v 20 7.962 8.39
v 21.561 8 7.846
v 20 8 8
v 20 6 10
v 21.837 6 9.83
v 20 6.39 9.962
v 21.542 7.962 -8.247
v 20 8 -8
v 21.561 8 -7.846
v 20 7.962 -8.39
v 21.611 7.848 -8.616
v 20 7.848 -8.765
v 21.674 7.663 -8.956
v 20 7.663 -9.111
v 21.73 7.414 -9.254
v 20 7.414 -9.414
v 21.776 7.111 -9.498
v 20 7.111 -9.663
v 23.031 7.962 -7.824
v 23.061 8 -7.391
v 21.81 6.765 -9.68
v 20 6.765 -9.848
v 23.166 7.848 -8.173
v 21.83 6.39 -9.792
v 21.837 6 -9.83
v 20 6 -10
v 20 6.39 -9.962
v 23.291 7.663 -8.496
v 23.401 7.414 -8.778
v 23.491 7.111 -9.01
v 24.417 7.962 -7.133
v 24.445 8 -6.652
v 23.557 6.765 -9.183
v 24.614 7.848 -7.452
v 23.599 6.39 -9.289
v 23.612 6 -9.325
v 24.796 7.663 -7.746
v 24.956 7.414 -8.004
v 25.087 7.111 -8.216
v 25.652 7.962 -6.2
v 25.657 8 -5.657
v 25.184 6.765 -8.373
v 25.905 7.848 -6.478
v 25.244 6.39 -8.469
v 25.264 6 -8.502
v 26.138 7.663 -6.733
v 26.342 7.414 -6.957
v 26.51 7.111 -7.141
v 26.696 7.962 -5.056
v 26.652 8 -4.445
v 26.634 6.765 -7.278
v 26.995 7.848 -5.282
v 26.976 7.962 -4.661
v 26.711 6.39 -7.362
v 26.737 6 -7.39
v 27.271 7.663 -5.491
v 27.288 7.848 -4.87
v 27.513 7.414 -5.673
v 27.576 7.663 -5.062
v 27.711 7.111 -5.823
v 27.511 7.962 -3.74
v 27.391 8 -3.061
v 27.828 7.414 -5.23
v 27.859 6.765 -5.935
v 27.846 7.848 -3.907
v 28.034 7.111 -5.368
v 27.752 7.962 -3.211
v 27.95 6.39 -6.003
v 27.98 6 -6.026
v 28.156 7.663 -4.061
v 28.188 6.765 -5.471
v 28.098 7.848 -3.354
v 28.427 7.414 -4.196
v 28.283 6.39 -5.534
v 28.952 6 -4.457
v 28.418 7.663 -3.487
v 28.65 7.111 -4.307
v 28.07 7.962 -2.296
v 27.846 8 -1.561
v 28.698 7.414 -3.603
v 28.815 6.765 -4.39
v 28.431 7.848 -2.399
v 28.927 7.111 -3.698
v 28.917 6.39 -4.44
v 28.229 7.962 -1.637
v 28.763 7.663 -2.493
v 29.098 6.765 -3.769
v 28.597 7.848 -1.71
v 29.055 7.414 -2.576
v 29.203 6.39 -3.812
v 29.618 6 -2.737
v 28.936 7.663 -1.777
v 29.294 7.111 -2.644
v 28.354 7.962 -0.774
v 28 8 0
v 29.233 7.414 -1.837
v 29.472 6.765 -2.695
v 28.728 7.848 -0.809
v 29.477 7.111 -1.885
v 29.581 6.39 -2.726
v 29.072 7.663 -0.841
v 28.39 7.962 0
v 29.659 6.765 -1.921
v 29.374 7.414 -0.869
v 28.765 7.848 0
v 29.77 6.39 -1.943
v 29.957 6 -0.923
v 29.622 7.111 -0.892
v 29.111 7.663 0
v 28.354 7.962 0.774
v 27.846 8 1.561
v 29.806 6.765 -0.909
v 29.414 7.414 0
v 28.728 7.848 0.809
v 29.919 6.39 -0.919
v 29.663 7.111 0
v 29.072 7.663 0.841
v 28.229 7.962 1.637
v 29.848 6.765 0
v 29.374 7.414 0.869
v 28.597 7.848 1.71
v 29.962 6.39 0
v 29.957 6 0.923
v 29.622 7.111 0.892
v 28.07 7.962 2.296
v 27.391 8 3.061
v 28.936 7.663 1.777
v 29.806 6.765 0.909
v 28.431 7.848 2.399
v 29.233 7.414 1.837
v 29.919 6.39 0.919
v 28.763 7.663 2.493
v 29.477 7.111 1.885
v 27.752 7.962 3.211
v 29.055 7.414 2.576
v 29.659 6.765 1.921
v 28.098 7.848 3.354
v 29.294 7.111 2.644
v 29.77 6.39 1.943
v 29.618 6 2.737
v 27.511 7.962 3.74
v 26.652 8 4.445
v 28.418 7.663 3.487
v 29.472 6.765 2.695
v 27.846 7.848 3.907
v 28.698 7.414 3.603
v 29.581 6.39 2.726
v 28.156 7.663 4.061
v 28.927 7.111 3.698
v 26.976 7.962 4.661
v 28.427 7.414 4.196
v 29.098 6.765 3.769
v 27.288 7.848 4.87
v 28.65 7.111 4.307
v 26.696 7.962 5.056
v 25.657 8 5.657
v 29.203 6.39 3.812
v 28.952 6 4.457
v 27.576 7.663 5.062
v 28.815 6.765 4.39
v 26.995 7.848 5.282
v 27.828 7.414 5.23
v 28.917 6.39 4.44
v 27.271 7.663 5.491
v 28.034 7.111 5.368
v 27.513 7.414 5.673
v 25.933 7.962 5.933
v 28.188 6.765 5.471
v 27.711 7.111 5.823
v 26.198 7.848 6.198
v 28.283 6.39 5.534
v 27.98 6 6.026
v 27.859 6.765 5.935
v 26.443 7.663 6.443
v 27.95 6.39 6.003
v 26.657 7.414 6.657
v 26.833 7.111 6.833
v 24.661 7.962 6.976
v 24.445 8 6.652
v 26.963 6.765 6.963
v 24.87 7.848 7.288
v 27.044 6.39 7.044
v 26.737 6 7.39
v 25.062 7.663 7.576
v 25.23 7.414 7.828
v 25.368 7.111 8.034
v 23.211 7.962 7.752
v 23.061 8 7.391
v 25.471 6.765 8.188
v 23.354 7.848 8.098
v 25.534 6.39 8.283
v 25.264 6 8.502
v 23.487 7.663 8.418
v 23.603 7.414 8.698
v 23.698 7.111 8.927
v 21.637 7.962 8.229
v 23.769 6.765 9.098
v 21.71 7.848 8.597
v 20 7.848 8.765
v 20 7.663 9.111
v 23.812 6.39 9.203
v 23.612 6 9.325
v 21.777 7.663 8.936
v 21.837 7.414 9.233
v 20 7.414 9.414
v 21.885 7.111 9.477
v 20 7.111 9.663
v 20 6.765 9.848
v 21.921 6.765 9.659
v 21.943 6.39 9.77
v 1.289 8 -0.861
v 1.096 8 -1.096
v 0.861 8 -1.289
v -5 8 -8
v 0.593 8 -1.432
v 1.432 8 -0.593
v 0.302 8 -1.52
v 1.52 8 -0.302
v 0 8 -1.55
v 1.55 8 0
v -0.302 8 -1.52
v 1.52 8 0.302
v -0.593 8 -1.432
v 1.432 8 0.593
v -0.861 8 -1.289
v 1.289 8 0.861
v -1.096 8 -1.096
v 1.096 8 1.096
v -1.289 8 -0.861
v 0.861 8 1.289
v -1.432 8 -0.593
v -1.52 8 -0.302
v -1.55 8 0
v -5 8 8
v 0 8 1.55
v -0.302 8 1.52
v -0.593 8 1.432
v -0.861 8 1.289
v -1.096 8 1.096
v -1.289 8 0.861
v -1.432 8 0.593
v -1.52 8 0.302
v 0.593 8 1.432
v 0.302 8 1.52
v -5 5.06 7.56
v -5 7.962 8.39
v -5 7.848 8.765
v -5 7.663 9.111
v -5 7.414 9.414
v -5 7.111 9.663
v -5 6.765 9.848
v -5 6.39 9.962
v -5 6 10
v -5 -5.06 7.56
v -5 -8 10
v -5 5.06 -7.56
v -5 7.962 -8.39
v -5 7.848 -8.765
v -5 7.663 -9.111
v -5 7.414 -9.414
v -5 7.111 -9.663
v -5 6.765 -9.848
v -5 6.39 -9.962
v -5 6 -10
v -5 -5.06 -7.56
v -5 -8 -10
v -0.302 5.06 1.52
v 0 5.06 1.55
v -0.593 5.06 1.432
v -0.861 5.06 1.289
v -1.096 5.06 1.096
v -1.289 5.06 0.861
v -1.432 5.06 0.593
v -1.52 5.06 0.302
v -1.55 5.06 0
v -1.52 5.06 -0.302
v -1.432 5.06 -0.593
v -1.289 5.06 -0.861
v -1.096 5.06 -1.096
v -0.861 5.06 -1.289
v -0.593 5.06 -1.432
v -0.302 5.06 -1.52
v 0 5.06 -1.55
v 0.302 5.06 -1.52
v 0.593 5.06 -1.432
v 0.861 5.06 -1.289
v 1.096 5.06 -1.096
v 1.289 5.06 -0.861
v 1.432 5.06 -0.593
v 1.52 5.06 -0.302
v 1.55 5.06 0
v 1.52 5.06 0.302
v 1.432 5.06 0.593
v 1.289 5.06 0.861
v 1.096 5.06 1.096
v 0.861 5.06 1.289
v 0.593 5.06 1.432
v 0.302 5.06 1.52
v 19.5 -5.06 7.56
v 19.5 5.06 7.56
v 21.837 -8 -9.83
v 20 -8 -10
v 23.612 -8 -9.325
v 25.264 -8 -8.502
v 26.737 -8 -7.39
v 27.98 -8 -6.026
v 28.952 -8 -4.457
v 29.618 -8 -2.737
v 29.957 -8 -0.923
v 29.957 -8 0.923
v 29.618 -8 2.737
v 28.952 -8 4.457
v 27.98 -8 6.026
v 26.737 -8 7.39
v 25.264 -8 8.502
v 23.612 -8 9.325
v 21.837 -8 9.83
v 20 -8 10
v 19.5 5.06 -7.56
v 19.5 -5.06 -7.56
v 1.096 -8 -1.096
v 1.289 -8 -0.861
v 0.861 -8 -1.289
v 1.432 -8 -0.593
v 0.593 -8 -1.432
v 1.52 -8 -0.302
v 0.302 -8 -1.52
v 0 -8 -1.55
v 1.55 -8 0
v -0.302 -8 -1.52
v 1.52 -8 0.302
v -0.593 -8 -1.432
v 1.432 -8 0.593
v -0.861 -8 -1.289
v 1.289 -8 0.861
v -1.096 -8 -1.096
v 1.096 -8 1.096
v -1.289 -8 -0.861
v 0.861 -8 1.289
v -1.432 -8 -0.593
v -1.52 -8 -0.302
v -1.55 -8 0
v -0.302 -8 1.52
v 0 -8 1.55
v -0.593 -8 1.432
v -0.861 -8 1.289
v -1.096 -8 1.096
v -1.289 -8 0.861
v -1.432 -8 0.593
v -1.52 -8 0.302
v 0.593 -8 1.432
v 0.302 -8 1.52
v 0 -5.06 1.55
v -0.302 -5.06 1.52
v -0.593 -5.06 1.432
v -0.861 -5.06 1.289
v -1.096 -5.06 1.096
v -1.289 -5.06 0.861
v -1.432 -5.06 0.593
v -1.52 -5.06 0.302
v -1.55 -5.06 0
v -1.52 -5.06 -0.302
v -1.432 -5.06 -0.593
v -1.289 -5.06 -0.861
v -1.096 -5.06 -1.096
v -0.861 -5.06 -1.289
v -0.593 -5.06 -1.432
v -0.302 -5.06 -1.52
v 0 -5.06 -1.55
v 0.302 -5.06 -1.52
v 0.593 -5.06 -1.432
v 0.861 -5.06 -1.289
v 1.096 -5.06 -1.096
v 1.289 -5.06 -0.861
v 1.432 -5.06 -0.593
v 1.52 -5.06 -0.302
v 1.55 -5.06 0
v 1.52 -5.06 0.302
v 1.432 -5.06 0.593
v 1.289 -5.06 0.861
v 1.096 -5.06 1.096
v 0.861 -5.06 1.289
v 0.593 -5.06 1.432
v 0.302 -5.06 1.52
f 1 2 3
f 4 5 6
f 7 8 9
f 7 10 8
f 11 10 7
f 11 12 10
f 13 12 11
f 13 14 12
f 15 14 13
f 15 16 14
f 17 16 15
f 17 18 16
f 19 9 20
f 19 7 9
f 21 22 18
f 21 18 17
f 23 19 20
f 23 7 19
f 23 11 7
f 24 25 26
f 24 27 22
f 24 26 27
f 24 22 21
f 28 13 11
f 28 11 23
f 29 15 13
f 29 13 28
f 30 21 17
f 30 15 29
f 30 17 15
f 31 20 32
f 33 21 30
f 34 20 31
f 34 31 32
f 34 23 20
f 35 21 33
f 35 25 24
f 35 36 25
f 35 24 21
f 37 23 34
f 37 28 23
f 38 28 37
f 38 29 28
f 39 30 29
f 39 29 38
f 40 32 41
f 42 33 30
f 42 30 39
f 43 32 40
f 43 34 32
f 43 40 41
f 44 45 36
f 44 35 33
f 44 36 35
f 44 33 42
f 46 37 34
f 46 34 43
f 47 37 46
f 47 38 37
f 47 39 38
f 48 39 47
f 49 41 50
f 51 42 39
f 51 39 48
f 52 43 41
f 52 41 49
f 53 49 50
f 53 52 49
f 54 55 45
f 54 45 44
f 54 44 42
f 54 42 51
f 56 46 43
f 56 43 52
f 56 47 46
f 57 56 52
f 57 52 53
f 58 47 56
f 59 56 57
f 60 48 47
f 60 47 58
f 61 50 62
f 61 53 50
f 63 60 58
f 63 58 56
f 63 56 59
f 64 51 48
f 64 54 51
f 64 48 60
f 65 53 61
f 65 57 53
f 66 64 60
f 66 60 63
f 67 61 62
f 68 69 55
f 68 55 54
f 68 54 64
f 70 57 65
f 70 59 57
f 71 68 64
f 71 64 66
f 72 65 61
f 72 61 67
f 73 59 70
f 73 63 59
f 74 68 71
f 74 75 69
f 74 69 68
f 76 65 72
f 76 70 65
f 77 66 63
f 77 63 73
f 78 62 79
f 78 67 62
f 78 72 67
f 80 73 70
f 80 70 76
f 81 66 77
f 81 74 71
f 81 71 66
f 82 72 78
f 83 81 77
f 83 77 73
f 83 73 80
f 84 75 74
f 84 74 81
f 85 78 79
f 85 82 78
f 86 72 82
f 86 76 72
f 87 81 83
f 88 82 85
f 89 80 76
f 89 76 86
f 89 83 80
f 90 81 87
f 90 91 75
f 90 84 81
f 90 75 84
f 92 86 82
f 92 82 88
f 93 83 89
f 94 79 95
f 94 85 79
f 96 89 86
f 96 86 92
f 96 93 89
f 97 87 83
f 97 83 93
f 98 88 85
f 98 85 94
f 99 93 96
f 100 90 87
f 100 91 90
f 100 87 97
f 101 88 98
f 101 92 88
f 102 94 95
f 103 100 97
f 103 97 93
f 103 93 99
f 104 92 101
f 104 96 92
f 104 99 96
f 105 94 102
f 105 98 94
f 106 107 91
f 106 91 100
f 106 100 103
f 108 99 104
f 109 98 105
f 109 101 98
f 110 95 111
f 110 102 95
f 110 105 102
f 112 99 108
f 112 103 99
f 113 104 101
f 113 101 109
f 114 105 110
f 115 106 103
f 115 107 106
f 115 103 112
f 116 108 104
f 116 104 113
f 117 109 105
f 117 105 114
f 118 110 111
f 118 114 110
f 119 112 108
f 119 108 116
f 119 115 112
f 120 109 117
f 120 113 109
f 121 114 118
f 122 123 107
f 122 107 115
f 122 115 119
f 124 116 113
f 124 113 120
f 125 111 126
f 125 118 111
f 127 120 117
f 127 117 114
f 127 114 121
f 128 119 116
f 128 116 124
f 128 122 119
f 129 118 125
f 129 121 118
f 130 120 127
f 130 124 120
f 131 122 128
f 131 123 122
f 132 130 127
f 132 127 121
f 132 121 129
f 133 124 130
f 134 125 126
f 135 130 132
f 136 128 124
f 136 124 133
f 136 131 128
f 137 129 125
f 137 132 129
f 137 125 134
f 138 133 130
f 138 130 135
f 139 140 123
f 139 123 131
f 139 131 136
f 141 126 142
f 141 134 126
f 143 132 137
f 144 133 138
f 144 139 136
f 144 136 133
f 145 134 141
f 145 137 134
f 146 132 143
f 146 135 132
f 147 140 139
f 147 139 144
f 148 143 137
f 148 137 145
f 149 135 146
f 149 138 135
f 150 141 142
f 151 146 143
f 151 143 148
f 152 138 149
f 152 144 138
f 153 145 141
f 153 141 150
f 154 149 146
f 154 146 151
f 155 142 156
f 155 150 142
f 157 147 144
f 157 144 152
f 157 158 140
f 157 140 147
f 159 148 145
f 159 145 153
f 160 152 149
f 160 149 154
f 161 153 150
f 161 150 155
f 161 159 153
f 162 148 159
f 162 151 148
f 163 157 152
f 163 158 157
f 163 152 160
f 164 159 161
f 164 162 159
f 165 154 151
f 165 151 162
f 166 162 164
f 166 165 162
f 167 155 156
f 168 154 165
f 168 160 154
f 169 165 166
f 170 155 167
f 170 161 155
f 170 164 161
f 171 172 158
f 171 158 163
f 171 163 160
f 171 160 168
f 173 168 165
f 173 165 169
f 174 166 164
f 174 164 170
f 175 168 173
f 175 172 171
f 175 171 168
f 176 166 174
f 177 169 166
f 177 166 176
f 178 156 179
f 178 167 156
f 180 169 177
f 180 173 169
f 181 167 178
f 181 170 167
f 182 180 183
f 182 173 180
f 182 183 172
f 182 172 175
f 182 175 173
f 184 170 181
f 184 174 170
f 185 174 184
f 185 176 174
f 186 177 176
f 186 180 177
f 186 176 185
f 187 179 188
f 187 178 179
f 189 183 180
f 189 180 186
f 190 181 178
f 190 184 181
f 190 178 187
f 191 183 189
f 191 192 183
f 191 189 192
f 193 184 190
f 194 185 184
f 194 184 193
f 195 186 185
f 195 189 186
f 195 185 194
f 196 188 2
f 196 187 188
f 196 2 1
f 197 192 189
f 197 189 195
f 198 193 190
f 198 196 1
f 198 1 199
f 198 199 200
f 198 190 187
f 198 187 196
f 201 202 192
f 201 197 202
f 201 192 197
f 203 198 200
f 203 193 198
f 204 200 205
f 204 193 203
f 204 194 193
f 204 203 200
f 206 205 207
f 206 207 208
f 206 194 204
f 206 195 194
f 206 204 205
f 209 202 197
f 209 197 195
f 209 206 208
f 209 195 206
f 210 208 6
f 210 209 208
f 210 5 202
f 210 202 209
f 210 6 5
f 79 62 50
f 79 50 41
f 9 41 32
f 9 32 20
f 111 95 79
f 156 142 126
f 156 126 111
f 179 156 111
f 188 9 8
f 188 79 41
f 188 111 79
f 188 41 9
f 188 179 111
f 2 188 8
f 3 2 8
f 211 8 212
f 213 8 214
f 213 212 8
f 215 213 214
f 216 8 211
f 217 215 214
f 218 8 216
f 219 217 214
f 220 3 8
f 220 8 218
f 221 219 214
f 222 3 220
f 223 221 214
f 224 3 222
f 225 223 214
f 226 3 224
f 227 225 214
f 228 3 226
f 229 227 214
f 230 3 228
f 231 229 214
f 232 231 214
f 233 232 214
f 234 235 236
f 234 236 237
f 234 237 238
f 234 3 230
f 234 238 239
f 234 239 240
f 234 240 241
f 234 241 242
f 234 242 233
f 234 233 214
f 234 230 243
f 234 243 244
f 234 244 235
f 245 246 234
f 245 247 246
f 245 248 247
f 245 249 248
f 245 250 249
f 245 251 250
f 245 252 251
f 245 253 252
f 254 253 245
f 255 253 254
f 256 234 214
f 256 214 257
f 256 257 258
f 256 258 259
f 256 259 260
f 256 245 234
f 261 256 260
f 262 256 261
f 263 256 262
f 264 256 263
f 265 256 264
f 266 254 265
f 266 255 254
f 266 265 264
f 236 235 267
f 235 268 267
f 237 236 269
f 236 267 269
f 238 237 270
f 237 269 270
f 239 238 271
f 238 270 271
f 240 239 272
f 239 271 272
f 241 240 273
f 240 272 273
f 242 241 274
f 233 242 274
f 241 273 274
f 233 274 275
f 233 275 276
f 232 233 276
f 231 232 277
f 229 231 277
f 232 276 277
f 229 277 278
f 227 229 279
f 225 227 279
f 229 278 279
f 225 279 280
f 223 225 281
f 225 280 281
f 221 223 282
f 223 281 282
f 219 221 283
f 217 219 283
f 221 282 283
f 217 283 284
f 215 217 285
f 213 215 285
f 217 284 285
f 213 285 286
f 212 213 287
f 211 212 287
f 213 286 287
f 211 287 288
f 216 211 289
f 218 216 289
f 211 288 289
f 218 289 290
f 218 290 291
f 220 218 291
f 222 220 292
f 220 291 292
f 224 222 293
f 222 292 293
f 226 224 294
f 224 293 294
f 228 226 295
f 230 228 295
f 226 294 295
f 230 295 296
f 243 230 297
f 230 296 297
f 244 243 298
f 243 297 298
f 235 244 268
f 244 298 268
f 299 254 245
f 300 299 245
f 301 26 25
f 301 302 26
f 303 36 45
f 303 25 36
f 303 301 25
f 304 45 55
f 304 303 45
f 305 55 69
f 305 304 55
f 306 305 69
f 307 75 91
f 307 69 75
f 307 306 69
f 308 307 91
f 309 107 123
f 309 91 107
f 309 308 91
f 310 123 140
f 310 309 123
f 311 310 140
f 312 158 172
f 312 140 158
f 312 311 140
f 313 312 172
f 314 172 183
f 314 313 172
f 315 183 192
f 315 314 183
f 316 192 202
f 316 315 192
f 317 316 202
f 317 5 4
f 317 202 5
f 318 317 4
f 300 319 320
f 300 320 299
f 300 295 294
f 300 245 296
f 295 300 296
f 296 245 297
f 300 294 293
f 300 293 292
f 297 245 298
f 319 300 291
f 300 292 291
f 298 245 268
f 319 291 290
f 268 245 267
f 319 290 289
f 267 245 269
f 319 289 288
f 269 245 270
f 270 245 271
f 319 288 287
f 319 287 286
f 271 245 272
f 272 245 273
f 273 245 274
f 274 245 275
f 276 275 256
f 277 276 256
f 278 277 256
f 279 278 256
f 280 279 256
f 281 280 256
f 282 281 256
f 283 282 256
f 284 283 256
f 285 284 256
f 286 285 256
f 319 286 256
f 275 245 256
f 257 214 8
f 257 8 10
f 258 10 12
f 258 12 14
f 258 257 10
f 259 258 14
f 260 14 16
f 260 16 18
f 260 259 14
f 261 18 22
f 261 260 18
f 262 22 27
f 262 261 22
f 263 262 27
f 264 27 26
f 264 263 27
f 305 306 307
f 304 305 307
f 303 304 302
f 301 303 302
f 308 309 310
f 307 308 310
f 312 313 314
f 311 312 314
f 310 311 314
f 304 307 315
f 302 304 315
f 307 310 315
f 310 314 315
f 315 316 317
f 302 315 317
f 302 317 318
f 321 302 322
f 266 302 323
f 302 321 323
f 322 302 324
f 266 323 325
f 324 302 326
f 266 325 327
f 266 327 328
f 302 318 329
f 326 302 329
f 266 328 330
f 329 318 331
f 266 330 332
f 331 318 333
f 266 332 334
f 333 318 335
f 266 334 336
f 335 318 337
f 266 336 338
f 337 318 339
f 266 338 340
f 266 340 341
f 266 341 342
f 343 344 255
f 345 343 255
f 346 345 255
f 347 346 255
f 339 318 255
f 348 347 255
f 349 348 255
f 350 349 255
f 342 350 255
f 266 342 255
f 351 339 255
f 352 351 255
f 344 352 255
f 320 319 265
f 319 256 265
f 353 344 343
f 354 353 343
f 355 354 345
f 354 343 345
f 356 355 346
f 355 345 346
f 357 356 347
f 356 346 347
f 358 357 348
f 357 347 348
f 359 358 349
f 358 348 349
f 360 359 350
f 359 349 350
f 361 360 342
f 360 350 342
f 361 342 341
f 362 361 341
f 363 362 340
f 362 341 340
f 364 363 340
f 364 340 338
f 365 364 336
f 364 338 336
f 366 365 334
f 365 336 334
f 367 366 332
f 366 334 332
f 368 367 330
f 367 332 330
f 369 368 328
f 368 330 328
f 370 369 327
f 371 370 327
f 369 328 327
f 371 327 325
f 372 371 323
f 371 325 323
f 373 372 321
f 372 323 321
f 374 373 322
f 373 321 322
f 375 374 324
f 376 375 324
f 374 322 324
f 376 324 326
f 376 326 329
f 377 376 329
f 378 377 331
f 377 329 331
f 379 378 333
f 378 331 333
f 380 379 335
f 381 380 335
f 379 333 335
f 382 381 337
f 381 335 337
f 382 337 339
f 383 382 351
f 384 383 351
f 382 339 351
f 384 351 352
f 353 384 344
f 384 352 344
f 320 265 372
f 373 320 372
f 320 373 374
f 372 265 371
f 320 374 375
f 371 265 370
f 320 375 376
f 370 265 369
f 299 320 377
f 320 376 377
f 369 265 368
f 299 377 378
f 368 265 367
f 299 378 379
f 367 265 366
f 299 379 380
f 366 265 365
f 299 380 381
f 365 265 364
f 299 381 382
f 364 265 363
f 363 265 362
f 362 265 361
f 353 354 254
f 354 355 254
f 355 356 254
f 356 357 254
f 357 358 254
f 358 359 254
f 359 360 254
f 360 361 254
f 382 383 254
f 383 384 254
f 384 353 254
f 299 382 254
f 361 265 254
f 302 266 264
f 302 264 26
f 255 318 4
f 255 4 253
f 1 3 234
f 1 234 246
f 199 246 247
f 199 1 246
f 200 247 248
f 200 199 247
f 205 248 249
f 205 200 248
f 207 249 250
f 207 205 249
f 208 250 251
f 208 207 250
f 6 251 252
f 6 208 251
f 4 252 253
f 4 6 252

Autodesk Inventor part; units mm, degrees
ref_plane "YZ Plane" through (0, 0, 0) normal (1, 0, 0) x (0, 1, 0)
ref_plane "XZ Plane" through (0, 0, 0) normal (0, 1, 0) x (-1, 0, 0)
ref_plane "XY Plane" through (0, 0, 0) normal (0, 0, 1) x (1, 0, 0)
sketch "Sketch1" plane through (0, 0, 0) normal (0, 1, 0) x (-1, 0, 0)
  line L0 (5, -10) -> (-20, -10)
  line L1 (-20, -10) -> (-20, 10)
  line L2 (-20, 10) -> (5, 10)
  line L3 (5, 10) -> (5, -10)
  line L4 (5, -10) -> (-20, 10) construction
  line L5 (-20, -10) -> (5, 10) construction
  circle A0 centre (-20, 0) radius 10
  point P0 (0, 0)
  point P1 (-7.5, 0)
  point P2 (-20, 10)
  dimension "d0" = 20
  dimension "d1" = 20
  dimension "d2" = 5
extrude "Extrusion1" add sketch "Sketch1" along normal mid plane 16
sketch "Sketch2" plane through (0, 8, 0) normal (0, 1, 0) x (1, 0, 0)
  point P0 (0, 0)
  point P1 (0, 0)
hole "Hole1" at (0, 8, 0) direction (0, -1, 0) diameter 3.1 end through all
sketch "Sketch3" plane through (-5, -8, 10) normal (-1, 0, 0) x (0, 0, 1)
  line L0 (-17.56, 2.94) -> (-2.44, 2.94)
  line L1 (-2.44, 2.94) -> (-2.44, 13.06)
  line L2 (-2.44, 13.06) -> (-17.56, 13.06)
  line L3 (-17.56, 13.06) -> (-17.56, 2.94)
  line L4 (-17.56, 2.94) -> (-2.44, 13.06) construction
  line L5 (-2.44, 2.94) -> (-17.56, 13.06) construction
  point P0 (-10, 8)
  dimension "d12" = 15.12
  dimension "d13" = 10.12
extrude "Extrusion2" cut sketch "Sketch3" against normal blind 24.5
fillet "Fillet1" radius 2 3 edges at (30, 8, 0) (7.5, 8, -10) (7.5, 8, 10)
properties part number "T-Frame Left Cover" material "ABS Plastic"
